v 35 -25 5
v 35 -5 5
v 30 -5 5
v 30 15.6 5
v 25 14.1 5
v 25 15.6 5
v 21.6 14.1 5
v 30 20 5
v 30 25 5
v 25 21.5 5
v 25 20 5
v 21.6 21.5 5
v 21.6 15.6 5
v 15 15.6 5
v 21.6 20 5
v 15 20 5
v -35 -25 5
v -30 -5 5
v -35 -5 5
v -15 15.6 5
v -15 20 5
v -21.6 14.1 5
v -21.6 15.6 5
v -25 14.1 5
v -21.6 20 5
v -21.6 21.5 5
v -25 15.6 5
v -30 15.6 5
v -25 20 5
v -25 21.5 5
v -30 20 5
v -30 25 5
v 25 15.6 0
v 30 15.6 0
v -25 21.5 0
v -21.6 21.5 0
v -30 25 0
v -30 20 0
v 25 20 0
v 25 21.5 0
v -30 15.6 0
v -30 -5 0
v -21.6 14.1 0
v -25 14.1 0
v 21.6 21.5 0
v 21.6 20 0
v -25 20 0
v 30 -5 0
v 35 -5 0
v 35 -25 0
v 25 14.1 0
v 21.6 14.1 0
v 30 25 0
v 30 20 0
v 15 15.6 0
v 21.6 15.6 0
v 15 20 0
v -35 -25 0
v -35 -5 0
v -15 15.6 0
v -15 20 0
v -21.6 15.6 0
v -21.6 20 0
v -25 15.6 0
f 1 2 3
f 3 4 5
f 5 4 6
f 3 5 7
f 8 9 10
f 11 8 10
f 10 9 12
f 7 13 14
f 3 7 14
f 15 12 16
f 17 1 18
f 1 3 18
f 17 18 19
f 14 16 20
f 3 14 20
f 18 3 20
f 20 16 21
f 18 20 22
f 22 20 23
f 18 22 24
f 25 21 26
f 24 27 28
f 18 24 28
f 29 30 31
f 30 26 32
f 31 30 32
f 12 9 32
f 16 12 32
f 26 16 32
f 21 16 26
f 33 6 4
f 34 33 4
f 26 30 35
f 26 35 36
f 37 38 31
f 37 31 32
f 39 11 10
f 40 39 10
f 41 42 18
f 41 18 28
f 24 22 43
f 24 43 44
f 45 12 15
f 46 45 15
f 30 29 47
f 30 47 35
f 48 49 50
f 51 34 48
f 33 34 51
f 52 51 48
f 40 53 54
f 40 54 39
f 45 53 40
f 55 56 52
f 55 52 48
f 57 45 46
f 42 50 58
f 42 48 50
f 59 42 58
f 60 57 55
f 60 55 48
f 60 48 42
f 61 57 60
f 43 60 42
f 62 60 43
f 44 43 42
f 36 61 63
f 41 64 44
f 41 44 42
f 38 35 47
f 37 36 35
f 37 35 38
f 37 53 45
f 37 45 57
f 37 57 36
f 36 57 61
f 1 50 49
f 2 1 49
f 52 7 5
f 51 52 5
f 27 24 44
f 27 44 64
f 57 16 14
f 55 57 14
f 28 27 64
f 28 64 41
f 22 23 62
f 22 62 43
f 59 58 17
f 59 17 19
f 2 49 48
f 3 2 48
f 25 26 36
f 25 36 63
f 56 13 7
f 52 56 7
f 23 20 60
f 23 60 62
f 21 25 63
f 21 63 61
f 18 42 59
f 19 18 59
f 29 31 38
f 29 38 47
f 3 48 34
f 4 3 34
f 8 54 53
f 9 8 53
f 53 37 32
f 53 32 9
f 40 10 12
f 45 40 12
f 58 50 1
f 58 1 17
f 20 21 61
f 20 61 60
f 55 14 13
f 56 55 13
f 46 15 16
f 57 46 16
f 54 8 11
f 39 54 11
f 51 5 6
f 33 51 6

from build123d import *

# Parameters (mm, degrees)
SKETCH1_W           = 60
SKETCH1_H           = 50
BOSS_EXTRUDE1_DEPTH = 5
CUT_EXTRUDE1_DEPTH  = 5
SKETCH6_W           = 5
SKETCH6_H           = 20
BOSS_EXTRUDE2_DEPTH = 5


with BuildPart() as part:
    # Sketch1 → Boss-Extrude1 (new body)
    with BuildSketch(Plane.XY):
        Rectangle(SKETCH1_W, SKETCH1_H)
    extrude(amount=BOSS_EXTRUDE1_DEPTH)

    # Sketch5 → Cut-Extrude1 (cut)
    with BuildSketch(Plane.XY.offset(5)):
        Polygon((-30, 15.6), (-30, 20), (-25, 20), (-25, 21.5), (-21.6, 21.5), (-21.6, 20), (-15, 20), (-15, 15.6), (-21.6, 15.6), (-21.6, 14.1), (-25, 14.1), (-25, 15.6), align=None)
        Polygon((30, 20), (25, 20), (25, 21.5), (21.6, 21.5), (21.6, 20), (15, 20), (15, 15.6), (21.6, 15.6), (21.6, 14.1), (25, 14.1), (25, 15.6), (30, 15.6), align=None)
    extrude(amount=-CUT_EXTRUDE1_DEPTH, mode=Mode.SUBTRACT)

    # Sketch6 → Boss-Extrude2 (add)
    with BuildSketch(Plane(origin=(0, 0, 0), x_dir=(-1, 0, 0), z_dir=(0, 0, -1))):
        with Locations((-32.5, -15)):
            Rectangle(SKETCH6_W, SKETCH6_H)
        with Locations((32.5, -15)):
            Rectangle(SKETCH6_W, SKETCH6_H)
    extrude(amount=-BOSS_EXTRUDE2_DEPTH)


solid = part.part
